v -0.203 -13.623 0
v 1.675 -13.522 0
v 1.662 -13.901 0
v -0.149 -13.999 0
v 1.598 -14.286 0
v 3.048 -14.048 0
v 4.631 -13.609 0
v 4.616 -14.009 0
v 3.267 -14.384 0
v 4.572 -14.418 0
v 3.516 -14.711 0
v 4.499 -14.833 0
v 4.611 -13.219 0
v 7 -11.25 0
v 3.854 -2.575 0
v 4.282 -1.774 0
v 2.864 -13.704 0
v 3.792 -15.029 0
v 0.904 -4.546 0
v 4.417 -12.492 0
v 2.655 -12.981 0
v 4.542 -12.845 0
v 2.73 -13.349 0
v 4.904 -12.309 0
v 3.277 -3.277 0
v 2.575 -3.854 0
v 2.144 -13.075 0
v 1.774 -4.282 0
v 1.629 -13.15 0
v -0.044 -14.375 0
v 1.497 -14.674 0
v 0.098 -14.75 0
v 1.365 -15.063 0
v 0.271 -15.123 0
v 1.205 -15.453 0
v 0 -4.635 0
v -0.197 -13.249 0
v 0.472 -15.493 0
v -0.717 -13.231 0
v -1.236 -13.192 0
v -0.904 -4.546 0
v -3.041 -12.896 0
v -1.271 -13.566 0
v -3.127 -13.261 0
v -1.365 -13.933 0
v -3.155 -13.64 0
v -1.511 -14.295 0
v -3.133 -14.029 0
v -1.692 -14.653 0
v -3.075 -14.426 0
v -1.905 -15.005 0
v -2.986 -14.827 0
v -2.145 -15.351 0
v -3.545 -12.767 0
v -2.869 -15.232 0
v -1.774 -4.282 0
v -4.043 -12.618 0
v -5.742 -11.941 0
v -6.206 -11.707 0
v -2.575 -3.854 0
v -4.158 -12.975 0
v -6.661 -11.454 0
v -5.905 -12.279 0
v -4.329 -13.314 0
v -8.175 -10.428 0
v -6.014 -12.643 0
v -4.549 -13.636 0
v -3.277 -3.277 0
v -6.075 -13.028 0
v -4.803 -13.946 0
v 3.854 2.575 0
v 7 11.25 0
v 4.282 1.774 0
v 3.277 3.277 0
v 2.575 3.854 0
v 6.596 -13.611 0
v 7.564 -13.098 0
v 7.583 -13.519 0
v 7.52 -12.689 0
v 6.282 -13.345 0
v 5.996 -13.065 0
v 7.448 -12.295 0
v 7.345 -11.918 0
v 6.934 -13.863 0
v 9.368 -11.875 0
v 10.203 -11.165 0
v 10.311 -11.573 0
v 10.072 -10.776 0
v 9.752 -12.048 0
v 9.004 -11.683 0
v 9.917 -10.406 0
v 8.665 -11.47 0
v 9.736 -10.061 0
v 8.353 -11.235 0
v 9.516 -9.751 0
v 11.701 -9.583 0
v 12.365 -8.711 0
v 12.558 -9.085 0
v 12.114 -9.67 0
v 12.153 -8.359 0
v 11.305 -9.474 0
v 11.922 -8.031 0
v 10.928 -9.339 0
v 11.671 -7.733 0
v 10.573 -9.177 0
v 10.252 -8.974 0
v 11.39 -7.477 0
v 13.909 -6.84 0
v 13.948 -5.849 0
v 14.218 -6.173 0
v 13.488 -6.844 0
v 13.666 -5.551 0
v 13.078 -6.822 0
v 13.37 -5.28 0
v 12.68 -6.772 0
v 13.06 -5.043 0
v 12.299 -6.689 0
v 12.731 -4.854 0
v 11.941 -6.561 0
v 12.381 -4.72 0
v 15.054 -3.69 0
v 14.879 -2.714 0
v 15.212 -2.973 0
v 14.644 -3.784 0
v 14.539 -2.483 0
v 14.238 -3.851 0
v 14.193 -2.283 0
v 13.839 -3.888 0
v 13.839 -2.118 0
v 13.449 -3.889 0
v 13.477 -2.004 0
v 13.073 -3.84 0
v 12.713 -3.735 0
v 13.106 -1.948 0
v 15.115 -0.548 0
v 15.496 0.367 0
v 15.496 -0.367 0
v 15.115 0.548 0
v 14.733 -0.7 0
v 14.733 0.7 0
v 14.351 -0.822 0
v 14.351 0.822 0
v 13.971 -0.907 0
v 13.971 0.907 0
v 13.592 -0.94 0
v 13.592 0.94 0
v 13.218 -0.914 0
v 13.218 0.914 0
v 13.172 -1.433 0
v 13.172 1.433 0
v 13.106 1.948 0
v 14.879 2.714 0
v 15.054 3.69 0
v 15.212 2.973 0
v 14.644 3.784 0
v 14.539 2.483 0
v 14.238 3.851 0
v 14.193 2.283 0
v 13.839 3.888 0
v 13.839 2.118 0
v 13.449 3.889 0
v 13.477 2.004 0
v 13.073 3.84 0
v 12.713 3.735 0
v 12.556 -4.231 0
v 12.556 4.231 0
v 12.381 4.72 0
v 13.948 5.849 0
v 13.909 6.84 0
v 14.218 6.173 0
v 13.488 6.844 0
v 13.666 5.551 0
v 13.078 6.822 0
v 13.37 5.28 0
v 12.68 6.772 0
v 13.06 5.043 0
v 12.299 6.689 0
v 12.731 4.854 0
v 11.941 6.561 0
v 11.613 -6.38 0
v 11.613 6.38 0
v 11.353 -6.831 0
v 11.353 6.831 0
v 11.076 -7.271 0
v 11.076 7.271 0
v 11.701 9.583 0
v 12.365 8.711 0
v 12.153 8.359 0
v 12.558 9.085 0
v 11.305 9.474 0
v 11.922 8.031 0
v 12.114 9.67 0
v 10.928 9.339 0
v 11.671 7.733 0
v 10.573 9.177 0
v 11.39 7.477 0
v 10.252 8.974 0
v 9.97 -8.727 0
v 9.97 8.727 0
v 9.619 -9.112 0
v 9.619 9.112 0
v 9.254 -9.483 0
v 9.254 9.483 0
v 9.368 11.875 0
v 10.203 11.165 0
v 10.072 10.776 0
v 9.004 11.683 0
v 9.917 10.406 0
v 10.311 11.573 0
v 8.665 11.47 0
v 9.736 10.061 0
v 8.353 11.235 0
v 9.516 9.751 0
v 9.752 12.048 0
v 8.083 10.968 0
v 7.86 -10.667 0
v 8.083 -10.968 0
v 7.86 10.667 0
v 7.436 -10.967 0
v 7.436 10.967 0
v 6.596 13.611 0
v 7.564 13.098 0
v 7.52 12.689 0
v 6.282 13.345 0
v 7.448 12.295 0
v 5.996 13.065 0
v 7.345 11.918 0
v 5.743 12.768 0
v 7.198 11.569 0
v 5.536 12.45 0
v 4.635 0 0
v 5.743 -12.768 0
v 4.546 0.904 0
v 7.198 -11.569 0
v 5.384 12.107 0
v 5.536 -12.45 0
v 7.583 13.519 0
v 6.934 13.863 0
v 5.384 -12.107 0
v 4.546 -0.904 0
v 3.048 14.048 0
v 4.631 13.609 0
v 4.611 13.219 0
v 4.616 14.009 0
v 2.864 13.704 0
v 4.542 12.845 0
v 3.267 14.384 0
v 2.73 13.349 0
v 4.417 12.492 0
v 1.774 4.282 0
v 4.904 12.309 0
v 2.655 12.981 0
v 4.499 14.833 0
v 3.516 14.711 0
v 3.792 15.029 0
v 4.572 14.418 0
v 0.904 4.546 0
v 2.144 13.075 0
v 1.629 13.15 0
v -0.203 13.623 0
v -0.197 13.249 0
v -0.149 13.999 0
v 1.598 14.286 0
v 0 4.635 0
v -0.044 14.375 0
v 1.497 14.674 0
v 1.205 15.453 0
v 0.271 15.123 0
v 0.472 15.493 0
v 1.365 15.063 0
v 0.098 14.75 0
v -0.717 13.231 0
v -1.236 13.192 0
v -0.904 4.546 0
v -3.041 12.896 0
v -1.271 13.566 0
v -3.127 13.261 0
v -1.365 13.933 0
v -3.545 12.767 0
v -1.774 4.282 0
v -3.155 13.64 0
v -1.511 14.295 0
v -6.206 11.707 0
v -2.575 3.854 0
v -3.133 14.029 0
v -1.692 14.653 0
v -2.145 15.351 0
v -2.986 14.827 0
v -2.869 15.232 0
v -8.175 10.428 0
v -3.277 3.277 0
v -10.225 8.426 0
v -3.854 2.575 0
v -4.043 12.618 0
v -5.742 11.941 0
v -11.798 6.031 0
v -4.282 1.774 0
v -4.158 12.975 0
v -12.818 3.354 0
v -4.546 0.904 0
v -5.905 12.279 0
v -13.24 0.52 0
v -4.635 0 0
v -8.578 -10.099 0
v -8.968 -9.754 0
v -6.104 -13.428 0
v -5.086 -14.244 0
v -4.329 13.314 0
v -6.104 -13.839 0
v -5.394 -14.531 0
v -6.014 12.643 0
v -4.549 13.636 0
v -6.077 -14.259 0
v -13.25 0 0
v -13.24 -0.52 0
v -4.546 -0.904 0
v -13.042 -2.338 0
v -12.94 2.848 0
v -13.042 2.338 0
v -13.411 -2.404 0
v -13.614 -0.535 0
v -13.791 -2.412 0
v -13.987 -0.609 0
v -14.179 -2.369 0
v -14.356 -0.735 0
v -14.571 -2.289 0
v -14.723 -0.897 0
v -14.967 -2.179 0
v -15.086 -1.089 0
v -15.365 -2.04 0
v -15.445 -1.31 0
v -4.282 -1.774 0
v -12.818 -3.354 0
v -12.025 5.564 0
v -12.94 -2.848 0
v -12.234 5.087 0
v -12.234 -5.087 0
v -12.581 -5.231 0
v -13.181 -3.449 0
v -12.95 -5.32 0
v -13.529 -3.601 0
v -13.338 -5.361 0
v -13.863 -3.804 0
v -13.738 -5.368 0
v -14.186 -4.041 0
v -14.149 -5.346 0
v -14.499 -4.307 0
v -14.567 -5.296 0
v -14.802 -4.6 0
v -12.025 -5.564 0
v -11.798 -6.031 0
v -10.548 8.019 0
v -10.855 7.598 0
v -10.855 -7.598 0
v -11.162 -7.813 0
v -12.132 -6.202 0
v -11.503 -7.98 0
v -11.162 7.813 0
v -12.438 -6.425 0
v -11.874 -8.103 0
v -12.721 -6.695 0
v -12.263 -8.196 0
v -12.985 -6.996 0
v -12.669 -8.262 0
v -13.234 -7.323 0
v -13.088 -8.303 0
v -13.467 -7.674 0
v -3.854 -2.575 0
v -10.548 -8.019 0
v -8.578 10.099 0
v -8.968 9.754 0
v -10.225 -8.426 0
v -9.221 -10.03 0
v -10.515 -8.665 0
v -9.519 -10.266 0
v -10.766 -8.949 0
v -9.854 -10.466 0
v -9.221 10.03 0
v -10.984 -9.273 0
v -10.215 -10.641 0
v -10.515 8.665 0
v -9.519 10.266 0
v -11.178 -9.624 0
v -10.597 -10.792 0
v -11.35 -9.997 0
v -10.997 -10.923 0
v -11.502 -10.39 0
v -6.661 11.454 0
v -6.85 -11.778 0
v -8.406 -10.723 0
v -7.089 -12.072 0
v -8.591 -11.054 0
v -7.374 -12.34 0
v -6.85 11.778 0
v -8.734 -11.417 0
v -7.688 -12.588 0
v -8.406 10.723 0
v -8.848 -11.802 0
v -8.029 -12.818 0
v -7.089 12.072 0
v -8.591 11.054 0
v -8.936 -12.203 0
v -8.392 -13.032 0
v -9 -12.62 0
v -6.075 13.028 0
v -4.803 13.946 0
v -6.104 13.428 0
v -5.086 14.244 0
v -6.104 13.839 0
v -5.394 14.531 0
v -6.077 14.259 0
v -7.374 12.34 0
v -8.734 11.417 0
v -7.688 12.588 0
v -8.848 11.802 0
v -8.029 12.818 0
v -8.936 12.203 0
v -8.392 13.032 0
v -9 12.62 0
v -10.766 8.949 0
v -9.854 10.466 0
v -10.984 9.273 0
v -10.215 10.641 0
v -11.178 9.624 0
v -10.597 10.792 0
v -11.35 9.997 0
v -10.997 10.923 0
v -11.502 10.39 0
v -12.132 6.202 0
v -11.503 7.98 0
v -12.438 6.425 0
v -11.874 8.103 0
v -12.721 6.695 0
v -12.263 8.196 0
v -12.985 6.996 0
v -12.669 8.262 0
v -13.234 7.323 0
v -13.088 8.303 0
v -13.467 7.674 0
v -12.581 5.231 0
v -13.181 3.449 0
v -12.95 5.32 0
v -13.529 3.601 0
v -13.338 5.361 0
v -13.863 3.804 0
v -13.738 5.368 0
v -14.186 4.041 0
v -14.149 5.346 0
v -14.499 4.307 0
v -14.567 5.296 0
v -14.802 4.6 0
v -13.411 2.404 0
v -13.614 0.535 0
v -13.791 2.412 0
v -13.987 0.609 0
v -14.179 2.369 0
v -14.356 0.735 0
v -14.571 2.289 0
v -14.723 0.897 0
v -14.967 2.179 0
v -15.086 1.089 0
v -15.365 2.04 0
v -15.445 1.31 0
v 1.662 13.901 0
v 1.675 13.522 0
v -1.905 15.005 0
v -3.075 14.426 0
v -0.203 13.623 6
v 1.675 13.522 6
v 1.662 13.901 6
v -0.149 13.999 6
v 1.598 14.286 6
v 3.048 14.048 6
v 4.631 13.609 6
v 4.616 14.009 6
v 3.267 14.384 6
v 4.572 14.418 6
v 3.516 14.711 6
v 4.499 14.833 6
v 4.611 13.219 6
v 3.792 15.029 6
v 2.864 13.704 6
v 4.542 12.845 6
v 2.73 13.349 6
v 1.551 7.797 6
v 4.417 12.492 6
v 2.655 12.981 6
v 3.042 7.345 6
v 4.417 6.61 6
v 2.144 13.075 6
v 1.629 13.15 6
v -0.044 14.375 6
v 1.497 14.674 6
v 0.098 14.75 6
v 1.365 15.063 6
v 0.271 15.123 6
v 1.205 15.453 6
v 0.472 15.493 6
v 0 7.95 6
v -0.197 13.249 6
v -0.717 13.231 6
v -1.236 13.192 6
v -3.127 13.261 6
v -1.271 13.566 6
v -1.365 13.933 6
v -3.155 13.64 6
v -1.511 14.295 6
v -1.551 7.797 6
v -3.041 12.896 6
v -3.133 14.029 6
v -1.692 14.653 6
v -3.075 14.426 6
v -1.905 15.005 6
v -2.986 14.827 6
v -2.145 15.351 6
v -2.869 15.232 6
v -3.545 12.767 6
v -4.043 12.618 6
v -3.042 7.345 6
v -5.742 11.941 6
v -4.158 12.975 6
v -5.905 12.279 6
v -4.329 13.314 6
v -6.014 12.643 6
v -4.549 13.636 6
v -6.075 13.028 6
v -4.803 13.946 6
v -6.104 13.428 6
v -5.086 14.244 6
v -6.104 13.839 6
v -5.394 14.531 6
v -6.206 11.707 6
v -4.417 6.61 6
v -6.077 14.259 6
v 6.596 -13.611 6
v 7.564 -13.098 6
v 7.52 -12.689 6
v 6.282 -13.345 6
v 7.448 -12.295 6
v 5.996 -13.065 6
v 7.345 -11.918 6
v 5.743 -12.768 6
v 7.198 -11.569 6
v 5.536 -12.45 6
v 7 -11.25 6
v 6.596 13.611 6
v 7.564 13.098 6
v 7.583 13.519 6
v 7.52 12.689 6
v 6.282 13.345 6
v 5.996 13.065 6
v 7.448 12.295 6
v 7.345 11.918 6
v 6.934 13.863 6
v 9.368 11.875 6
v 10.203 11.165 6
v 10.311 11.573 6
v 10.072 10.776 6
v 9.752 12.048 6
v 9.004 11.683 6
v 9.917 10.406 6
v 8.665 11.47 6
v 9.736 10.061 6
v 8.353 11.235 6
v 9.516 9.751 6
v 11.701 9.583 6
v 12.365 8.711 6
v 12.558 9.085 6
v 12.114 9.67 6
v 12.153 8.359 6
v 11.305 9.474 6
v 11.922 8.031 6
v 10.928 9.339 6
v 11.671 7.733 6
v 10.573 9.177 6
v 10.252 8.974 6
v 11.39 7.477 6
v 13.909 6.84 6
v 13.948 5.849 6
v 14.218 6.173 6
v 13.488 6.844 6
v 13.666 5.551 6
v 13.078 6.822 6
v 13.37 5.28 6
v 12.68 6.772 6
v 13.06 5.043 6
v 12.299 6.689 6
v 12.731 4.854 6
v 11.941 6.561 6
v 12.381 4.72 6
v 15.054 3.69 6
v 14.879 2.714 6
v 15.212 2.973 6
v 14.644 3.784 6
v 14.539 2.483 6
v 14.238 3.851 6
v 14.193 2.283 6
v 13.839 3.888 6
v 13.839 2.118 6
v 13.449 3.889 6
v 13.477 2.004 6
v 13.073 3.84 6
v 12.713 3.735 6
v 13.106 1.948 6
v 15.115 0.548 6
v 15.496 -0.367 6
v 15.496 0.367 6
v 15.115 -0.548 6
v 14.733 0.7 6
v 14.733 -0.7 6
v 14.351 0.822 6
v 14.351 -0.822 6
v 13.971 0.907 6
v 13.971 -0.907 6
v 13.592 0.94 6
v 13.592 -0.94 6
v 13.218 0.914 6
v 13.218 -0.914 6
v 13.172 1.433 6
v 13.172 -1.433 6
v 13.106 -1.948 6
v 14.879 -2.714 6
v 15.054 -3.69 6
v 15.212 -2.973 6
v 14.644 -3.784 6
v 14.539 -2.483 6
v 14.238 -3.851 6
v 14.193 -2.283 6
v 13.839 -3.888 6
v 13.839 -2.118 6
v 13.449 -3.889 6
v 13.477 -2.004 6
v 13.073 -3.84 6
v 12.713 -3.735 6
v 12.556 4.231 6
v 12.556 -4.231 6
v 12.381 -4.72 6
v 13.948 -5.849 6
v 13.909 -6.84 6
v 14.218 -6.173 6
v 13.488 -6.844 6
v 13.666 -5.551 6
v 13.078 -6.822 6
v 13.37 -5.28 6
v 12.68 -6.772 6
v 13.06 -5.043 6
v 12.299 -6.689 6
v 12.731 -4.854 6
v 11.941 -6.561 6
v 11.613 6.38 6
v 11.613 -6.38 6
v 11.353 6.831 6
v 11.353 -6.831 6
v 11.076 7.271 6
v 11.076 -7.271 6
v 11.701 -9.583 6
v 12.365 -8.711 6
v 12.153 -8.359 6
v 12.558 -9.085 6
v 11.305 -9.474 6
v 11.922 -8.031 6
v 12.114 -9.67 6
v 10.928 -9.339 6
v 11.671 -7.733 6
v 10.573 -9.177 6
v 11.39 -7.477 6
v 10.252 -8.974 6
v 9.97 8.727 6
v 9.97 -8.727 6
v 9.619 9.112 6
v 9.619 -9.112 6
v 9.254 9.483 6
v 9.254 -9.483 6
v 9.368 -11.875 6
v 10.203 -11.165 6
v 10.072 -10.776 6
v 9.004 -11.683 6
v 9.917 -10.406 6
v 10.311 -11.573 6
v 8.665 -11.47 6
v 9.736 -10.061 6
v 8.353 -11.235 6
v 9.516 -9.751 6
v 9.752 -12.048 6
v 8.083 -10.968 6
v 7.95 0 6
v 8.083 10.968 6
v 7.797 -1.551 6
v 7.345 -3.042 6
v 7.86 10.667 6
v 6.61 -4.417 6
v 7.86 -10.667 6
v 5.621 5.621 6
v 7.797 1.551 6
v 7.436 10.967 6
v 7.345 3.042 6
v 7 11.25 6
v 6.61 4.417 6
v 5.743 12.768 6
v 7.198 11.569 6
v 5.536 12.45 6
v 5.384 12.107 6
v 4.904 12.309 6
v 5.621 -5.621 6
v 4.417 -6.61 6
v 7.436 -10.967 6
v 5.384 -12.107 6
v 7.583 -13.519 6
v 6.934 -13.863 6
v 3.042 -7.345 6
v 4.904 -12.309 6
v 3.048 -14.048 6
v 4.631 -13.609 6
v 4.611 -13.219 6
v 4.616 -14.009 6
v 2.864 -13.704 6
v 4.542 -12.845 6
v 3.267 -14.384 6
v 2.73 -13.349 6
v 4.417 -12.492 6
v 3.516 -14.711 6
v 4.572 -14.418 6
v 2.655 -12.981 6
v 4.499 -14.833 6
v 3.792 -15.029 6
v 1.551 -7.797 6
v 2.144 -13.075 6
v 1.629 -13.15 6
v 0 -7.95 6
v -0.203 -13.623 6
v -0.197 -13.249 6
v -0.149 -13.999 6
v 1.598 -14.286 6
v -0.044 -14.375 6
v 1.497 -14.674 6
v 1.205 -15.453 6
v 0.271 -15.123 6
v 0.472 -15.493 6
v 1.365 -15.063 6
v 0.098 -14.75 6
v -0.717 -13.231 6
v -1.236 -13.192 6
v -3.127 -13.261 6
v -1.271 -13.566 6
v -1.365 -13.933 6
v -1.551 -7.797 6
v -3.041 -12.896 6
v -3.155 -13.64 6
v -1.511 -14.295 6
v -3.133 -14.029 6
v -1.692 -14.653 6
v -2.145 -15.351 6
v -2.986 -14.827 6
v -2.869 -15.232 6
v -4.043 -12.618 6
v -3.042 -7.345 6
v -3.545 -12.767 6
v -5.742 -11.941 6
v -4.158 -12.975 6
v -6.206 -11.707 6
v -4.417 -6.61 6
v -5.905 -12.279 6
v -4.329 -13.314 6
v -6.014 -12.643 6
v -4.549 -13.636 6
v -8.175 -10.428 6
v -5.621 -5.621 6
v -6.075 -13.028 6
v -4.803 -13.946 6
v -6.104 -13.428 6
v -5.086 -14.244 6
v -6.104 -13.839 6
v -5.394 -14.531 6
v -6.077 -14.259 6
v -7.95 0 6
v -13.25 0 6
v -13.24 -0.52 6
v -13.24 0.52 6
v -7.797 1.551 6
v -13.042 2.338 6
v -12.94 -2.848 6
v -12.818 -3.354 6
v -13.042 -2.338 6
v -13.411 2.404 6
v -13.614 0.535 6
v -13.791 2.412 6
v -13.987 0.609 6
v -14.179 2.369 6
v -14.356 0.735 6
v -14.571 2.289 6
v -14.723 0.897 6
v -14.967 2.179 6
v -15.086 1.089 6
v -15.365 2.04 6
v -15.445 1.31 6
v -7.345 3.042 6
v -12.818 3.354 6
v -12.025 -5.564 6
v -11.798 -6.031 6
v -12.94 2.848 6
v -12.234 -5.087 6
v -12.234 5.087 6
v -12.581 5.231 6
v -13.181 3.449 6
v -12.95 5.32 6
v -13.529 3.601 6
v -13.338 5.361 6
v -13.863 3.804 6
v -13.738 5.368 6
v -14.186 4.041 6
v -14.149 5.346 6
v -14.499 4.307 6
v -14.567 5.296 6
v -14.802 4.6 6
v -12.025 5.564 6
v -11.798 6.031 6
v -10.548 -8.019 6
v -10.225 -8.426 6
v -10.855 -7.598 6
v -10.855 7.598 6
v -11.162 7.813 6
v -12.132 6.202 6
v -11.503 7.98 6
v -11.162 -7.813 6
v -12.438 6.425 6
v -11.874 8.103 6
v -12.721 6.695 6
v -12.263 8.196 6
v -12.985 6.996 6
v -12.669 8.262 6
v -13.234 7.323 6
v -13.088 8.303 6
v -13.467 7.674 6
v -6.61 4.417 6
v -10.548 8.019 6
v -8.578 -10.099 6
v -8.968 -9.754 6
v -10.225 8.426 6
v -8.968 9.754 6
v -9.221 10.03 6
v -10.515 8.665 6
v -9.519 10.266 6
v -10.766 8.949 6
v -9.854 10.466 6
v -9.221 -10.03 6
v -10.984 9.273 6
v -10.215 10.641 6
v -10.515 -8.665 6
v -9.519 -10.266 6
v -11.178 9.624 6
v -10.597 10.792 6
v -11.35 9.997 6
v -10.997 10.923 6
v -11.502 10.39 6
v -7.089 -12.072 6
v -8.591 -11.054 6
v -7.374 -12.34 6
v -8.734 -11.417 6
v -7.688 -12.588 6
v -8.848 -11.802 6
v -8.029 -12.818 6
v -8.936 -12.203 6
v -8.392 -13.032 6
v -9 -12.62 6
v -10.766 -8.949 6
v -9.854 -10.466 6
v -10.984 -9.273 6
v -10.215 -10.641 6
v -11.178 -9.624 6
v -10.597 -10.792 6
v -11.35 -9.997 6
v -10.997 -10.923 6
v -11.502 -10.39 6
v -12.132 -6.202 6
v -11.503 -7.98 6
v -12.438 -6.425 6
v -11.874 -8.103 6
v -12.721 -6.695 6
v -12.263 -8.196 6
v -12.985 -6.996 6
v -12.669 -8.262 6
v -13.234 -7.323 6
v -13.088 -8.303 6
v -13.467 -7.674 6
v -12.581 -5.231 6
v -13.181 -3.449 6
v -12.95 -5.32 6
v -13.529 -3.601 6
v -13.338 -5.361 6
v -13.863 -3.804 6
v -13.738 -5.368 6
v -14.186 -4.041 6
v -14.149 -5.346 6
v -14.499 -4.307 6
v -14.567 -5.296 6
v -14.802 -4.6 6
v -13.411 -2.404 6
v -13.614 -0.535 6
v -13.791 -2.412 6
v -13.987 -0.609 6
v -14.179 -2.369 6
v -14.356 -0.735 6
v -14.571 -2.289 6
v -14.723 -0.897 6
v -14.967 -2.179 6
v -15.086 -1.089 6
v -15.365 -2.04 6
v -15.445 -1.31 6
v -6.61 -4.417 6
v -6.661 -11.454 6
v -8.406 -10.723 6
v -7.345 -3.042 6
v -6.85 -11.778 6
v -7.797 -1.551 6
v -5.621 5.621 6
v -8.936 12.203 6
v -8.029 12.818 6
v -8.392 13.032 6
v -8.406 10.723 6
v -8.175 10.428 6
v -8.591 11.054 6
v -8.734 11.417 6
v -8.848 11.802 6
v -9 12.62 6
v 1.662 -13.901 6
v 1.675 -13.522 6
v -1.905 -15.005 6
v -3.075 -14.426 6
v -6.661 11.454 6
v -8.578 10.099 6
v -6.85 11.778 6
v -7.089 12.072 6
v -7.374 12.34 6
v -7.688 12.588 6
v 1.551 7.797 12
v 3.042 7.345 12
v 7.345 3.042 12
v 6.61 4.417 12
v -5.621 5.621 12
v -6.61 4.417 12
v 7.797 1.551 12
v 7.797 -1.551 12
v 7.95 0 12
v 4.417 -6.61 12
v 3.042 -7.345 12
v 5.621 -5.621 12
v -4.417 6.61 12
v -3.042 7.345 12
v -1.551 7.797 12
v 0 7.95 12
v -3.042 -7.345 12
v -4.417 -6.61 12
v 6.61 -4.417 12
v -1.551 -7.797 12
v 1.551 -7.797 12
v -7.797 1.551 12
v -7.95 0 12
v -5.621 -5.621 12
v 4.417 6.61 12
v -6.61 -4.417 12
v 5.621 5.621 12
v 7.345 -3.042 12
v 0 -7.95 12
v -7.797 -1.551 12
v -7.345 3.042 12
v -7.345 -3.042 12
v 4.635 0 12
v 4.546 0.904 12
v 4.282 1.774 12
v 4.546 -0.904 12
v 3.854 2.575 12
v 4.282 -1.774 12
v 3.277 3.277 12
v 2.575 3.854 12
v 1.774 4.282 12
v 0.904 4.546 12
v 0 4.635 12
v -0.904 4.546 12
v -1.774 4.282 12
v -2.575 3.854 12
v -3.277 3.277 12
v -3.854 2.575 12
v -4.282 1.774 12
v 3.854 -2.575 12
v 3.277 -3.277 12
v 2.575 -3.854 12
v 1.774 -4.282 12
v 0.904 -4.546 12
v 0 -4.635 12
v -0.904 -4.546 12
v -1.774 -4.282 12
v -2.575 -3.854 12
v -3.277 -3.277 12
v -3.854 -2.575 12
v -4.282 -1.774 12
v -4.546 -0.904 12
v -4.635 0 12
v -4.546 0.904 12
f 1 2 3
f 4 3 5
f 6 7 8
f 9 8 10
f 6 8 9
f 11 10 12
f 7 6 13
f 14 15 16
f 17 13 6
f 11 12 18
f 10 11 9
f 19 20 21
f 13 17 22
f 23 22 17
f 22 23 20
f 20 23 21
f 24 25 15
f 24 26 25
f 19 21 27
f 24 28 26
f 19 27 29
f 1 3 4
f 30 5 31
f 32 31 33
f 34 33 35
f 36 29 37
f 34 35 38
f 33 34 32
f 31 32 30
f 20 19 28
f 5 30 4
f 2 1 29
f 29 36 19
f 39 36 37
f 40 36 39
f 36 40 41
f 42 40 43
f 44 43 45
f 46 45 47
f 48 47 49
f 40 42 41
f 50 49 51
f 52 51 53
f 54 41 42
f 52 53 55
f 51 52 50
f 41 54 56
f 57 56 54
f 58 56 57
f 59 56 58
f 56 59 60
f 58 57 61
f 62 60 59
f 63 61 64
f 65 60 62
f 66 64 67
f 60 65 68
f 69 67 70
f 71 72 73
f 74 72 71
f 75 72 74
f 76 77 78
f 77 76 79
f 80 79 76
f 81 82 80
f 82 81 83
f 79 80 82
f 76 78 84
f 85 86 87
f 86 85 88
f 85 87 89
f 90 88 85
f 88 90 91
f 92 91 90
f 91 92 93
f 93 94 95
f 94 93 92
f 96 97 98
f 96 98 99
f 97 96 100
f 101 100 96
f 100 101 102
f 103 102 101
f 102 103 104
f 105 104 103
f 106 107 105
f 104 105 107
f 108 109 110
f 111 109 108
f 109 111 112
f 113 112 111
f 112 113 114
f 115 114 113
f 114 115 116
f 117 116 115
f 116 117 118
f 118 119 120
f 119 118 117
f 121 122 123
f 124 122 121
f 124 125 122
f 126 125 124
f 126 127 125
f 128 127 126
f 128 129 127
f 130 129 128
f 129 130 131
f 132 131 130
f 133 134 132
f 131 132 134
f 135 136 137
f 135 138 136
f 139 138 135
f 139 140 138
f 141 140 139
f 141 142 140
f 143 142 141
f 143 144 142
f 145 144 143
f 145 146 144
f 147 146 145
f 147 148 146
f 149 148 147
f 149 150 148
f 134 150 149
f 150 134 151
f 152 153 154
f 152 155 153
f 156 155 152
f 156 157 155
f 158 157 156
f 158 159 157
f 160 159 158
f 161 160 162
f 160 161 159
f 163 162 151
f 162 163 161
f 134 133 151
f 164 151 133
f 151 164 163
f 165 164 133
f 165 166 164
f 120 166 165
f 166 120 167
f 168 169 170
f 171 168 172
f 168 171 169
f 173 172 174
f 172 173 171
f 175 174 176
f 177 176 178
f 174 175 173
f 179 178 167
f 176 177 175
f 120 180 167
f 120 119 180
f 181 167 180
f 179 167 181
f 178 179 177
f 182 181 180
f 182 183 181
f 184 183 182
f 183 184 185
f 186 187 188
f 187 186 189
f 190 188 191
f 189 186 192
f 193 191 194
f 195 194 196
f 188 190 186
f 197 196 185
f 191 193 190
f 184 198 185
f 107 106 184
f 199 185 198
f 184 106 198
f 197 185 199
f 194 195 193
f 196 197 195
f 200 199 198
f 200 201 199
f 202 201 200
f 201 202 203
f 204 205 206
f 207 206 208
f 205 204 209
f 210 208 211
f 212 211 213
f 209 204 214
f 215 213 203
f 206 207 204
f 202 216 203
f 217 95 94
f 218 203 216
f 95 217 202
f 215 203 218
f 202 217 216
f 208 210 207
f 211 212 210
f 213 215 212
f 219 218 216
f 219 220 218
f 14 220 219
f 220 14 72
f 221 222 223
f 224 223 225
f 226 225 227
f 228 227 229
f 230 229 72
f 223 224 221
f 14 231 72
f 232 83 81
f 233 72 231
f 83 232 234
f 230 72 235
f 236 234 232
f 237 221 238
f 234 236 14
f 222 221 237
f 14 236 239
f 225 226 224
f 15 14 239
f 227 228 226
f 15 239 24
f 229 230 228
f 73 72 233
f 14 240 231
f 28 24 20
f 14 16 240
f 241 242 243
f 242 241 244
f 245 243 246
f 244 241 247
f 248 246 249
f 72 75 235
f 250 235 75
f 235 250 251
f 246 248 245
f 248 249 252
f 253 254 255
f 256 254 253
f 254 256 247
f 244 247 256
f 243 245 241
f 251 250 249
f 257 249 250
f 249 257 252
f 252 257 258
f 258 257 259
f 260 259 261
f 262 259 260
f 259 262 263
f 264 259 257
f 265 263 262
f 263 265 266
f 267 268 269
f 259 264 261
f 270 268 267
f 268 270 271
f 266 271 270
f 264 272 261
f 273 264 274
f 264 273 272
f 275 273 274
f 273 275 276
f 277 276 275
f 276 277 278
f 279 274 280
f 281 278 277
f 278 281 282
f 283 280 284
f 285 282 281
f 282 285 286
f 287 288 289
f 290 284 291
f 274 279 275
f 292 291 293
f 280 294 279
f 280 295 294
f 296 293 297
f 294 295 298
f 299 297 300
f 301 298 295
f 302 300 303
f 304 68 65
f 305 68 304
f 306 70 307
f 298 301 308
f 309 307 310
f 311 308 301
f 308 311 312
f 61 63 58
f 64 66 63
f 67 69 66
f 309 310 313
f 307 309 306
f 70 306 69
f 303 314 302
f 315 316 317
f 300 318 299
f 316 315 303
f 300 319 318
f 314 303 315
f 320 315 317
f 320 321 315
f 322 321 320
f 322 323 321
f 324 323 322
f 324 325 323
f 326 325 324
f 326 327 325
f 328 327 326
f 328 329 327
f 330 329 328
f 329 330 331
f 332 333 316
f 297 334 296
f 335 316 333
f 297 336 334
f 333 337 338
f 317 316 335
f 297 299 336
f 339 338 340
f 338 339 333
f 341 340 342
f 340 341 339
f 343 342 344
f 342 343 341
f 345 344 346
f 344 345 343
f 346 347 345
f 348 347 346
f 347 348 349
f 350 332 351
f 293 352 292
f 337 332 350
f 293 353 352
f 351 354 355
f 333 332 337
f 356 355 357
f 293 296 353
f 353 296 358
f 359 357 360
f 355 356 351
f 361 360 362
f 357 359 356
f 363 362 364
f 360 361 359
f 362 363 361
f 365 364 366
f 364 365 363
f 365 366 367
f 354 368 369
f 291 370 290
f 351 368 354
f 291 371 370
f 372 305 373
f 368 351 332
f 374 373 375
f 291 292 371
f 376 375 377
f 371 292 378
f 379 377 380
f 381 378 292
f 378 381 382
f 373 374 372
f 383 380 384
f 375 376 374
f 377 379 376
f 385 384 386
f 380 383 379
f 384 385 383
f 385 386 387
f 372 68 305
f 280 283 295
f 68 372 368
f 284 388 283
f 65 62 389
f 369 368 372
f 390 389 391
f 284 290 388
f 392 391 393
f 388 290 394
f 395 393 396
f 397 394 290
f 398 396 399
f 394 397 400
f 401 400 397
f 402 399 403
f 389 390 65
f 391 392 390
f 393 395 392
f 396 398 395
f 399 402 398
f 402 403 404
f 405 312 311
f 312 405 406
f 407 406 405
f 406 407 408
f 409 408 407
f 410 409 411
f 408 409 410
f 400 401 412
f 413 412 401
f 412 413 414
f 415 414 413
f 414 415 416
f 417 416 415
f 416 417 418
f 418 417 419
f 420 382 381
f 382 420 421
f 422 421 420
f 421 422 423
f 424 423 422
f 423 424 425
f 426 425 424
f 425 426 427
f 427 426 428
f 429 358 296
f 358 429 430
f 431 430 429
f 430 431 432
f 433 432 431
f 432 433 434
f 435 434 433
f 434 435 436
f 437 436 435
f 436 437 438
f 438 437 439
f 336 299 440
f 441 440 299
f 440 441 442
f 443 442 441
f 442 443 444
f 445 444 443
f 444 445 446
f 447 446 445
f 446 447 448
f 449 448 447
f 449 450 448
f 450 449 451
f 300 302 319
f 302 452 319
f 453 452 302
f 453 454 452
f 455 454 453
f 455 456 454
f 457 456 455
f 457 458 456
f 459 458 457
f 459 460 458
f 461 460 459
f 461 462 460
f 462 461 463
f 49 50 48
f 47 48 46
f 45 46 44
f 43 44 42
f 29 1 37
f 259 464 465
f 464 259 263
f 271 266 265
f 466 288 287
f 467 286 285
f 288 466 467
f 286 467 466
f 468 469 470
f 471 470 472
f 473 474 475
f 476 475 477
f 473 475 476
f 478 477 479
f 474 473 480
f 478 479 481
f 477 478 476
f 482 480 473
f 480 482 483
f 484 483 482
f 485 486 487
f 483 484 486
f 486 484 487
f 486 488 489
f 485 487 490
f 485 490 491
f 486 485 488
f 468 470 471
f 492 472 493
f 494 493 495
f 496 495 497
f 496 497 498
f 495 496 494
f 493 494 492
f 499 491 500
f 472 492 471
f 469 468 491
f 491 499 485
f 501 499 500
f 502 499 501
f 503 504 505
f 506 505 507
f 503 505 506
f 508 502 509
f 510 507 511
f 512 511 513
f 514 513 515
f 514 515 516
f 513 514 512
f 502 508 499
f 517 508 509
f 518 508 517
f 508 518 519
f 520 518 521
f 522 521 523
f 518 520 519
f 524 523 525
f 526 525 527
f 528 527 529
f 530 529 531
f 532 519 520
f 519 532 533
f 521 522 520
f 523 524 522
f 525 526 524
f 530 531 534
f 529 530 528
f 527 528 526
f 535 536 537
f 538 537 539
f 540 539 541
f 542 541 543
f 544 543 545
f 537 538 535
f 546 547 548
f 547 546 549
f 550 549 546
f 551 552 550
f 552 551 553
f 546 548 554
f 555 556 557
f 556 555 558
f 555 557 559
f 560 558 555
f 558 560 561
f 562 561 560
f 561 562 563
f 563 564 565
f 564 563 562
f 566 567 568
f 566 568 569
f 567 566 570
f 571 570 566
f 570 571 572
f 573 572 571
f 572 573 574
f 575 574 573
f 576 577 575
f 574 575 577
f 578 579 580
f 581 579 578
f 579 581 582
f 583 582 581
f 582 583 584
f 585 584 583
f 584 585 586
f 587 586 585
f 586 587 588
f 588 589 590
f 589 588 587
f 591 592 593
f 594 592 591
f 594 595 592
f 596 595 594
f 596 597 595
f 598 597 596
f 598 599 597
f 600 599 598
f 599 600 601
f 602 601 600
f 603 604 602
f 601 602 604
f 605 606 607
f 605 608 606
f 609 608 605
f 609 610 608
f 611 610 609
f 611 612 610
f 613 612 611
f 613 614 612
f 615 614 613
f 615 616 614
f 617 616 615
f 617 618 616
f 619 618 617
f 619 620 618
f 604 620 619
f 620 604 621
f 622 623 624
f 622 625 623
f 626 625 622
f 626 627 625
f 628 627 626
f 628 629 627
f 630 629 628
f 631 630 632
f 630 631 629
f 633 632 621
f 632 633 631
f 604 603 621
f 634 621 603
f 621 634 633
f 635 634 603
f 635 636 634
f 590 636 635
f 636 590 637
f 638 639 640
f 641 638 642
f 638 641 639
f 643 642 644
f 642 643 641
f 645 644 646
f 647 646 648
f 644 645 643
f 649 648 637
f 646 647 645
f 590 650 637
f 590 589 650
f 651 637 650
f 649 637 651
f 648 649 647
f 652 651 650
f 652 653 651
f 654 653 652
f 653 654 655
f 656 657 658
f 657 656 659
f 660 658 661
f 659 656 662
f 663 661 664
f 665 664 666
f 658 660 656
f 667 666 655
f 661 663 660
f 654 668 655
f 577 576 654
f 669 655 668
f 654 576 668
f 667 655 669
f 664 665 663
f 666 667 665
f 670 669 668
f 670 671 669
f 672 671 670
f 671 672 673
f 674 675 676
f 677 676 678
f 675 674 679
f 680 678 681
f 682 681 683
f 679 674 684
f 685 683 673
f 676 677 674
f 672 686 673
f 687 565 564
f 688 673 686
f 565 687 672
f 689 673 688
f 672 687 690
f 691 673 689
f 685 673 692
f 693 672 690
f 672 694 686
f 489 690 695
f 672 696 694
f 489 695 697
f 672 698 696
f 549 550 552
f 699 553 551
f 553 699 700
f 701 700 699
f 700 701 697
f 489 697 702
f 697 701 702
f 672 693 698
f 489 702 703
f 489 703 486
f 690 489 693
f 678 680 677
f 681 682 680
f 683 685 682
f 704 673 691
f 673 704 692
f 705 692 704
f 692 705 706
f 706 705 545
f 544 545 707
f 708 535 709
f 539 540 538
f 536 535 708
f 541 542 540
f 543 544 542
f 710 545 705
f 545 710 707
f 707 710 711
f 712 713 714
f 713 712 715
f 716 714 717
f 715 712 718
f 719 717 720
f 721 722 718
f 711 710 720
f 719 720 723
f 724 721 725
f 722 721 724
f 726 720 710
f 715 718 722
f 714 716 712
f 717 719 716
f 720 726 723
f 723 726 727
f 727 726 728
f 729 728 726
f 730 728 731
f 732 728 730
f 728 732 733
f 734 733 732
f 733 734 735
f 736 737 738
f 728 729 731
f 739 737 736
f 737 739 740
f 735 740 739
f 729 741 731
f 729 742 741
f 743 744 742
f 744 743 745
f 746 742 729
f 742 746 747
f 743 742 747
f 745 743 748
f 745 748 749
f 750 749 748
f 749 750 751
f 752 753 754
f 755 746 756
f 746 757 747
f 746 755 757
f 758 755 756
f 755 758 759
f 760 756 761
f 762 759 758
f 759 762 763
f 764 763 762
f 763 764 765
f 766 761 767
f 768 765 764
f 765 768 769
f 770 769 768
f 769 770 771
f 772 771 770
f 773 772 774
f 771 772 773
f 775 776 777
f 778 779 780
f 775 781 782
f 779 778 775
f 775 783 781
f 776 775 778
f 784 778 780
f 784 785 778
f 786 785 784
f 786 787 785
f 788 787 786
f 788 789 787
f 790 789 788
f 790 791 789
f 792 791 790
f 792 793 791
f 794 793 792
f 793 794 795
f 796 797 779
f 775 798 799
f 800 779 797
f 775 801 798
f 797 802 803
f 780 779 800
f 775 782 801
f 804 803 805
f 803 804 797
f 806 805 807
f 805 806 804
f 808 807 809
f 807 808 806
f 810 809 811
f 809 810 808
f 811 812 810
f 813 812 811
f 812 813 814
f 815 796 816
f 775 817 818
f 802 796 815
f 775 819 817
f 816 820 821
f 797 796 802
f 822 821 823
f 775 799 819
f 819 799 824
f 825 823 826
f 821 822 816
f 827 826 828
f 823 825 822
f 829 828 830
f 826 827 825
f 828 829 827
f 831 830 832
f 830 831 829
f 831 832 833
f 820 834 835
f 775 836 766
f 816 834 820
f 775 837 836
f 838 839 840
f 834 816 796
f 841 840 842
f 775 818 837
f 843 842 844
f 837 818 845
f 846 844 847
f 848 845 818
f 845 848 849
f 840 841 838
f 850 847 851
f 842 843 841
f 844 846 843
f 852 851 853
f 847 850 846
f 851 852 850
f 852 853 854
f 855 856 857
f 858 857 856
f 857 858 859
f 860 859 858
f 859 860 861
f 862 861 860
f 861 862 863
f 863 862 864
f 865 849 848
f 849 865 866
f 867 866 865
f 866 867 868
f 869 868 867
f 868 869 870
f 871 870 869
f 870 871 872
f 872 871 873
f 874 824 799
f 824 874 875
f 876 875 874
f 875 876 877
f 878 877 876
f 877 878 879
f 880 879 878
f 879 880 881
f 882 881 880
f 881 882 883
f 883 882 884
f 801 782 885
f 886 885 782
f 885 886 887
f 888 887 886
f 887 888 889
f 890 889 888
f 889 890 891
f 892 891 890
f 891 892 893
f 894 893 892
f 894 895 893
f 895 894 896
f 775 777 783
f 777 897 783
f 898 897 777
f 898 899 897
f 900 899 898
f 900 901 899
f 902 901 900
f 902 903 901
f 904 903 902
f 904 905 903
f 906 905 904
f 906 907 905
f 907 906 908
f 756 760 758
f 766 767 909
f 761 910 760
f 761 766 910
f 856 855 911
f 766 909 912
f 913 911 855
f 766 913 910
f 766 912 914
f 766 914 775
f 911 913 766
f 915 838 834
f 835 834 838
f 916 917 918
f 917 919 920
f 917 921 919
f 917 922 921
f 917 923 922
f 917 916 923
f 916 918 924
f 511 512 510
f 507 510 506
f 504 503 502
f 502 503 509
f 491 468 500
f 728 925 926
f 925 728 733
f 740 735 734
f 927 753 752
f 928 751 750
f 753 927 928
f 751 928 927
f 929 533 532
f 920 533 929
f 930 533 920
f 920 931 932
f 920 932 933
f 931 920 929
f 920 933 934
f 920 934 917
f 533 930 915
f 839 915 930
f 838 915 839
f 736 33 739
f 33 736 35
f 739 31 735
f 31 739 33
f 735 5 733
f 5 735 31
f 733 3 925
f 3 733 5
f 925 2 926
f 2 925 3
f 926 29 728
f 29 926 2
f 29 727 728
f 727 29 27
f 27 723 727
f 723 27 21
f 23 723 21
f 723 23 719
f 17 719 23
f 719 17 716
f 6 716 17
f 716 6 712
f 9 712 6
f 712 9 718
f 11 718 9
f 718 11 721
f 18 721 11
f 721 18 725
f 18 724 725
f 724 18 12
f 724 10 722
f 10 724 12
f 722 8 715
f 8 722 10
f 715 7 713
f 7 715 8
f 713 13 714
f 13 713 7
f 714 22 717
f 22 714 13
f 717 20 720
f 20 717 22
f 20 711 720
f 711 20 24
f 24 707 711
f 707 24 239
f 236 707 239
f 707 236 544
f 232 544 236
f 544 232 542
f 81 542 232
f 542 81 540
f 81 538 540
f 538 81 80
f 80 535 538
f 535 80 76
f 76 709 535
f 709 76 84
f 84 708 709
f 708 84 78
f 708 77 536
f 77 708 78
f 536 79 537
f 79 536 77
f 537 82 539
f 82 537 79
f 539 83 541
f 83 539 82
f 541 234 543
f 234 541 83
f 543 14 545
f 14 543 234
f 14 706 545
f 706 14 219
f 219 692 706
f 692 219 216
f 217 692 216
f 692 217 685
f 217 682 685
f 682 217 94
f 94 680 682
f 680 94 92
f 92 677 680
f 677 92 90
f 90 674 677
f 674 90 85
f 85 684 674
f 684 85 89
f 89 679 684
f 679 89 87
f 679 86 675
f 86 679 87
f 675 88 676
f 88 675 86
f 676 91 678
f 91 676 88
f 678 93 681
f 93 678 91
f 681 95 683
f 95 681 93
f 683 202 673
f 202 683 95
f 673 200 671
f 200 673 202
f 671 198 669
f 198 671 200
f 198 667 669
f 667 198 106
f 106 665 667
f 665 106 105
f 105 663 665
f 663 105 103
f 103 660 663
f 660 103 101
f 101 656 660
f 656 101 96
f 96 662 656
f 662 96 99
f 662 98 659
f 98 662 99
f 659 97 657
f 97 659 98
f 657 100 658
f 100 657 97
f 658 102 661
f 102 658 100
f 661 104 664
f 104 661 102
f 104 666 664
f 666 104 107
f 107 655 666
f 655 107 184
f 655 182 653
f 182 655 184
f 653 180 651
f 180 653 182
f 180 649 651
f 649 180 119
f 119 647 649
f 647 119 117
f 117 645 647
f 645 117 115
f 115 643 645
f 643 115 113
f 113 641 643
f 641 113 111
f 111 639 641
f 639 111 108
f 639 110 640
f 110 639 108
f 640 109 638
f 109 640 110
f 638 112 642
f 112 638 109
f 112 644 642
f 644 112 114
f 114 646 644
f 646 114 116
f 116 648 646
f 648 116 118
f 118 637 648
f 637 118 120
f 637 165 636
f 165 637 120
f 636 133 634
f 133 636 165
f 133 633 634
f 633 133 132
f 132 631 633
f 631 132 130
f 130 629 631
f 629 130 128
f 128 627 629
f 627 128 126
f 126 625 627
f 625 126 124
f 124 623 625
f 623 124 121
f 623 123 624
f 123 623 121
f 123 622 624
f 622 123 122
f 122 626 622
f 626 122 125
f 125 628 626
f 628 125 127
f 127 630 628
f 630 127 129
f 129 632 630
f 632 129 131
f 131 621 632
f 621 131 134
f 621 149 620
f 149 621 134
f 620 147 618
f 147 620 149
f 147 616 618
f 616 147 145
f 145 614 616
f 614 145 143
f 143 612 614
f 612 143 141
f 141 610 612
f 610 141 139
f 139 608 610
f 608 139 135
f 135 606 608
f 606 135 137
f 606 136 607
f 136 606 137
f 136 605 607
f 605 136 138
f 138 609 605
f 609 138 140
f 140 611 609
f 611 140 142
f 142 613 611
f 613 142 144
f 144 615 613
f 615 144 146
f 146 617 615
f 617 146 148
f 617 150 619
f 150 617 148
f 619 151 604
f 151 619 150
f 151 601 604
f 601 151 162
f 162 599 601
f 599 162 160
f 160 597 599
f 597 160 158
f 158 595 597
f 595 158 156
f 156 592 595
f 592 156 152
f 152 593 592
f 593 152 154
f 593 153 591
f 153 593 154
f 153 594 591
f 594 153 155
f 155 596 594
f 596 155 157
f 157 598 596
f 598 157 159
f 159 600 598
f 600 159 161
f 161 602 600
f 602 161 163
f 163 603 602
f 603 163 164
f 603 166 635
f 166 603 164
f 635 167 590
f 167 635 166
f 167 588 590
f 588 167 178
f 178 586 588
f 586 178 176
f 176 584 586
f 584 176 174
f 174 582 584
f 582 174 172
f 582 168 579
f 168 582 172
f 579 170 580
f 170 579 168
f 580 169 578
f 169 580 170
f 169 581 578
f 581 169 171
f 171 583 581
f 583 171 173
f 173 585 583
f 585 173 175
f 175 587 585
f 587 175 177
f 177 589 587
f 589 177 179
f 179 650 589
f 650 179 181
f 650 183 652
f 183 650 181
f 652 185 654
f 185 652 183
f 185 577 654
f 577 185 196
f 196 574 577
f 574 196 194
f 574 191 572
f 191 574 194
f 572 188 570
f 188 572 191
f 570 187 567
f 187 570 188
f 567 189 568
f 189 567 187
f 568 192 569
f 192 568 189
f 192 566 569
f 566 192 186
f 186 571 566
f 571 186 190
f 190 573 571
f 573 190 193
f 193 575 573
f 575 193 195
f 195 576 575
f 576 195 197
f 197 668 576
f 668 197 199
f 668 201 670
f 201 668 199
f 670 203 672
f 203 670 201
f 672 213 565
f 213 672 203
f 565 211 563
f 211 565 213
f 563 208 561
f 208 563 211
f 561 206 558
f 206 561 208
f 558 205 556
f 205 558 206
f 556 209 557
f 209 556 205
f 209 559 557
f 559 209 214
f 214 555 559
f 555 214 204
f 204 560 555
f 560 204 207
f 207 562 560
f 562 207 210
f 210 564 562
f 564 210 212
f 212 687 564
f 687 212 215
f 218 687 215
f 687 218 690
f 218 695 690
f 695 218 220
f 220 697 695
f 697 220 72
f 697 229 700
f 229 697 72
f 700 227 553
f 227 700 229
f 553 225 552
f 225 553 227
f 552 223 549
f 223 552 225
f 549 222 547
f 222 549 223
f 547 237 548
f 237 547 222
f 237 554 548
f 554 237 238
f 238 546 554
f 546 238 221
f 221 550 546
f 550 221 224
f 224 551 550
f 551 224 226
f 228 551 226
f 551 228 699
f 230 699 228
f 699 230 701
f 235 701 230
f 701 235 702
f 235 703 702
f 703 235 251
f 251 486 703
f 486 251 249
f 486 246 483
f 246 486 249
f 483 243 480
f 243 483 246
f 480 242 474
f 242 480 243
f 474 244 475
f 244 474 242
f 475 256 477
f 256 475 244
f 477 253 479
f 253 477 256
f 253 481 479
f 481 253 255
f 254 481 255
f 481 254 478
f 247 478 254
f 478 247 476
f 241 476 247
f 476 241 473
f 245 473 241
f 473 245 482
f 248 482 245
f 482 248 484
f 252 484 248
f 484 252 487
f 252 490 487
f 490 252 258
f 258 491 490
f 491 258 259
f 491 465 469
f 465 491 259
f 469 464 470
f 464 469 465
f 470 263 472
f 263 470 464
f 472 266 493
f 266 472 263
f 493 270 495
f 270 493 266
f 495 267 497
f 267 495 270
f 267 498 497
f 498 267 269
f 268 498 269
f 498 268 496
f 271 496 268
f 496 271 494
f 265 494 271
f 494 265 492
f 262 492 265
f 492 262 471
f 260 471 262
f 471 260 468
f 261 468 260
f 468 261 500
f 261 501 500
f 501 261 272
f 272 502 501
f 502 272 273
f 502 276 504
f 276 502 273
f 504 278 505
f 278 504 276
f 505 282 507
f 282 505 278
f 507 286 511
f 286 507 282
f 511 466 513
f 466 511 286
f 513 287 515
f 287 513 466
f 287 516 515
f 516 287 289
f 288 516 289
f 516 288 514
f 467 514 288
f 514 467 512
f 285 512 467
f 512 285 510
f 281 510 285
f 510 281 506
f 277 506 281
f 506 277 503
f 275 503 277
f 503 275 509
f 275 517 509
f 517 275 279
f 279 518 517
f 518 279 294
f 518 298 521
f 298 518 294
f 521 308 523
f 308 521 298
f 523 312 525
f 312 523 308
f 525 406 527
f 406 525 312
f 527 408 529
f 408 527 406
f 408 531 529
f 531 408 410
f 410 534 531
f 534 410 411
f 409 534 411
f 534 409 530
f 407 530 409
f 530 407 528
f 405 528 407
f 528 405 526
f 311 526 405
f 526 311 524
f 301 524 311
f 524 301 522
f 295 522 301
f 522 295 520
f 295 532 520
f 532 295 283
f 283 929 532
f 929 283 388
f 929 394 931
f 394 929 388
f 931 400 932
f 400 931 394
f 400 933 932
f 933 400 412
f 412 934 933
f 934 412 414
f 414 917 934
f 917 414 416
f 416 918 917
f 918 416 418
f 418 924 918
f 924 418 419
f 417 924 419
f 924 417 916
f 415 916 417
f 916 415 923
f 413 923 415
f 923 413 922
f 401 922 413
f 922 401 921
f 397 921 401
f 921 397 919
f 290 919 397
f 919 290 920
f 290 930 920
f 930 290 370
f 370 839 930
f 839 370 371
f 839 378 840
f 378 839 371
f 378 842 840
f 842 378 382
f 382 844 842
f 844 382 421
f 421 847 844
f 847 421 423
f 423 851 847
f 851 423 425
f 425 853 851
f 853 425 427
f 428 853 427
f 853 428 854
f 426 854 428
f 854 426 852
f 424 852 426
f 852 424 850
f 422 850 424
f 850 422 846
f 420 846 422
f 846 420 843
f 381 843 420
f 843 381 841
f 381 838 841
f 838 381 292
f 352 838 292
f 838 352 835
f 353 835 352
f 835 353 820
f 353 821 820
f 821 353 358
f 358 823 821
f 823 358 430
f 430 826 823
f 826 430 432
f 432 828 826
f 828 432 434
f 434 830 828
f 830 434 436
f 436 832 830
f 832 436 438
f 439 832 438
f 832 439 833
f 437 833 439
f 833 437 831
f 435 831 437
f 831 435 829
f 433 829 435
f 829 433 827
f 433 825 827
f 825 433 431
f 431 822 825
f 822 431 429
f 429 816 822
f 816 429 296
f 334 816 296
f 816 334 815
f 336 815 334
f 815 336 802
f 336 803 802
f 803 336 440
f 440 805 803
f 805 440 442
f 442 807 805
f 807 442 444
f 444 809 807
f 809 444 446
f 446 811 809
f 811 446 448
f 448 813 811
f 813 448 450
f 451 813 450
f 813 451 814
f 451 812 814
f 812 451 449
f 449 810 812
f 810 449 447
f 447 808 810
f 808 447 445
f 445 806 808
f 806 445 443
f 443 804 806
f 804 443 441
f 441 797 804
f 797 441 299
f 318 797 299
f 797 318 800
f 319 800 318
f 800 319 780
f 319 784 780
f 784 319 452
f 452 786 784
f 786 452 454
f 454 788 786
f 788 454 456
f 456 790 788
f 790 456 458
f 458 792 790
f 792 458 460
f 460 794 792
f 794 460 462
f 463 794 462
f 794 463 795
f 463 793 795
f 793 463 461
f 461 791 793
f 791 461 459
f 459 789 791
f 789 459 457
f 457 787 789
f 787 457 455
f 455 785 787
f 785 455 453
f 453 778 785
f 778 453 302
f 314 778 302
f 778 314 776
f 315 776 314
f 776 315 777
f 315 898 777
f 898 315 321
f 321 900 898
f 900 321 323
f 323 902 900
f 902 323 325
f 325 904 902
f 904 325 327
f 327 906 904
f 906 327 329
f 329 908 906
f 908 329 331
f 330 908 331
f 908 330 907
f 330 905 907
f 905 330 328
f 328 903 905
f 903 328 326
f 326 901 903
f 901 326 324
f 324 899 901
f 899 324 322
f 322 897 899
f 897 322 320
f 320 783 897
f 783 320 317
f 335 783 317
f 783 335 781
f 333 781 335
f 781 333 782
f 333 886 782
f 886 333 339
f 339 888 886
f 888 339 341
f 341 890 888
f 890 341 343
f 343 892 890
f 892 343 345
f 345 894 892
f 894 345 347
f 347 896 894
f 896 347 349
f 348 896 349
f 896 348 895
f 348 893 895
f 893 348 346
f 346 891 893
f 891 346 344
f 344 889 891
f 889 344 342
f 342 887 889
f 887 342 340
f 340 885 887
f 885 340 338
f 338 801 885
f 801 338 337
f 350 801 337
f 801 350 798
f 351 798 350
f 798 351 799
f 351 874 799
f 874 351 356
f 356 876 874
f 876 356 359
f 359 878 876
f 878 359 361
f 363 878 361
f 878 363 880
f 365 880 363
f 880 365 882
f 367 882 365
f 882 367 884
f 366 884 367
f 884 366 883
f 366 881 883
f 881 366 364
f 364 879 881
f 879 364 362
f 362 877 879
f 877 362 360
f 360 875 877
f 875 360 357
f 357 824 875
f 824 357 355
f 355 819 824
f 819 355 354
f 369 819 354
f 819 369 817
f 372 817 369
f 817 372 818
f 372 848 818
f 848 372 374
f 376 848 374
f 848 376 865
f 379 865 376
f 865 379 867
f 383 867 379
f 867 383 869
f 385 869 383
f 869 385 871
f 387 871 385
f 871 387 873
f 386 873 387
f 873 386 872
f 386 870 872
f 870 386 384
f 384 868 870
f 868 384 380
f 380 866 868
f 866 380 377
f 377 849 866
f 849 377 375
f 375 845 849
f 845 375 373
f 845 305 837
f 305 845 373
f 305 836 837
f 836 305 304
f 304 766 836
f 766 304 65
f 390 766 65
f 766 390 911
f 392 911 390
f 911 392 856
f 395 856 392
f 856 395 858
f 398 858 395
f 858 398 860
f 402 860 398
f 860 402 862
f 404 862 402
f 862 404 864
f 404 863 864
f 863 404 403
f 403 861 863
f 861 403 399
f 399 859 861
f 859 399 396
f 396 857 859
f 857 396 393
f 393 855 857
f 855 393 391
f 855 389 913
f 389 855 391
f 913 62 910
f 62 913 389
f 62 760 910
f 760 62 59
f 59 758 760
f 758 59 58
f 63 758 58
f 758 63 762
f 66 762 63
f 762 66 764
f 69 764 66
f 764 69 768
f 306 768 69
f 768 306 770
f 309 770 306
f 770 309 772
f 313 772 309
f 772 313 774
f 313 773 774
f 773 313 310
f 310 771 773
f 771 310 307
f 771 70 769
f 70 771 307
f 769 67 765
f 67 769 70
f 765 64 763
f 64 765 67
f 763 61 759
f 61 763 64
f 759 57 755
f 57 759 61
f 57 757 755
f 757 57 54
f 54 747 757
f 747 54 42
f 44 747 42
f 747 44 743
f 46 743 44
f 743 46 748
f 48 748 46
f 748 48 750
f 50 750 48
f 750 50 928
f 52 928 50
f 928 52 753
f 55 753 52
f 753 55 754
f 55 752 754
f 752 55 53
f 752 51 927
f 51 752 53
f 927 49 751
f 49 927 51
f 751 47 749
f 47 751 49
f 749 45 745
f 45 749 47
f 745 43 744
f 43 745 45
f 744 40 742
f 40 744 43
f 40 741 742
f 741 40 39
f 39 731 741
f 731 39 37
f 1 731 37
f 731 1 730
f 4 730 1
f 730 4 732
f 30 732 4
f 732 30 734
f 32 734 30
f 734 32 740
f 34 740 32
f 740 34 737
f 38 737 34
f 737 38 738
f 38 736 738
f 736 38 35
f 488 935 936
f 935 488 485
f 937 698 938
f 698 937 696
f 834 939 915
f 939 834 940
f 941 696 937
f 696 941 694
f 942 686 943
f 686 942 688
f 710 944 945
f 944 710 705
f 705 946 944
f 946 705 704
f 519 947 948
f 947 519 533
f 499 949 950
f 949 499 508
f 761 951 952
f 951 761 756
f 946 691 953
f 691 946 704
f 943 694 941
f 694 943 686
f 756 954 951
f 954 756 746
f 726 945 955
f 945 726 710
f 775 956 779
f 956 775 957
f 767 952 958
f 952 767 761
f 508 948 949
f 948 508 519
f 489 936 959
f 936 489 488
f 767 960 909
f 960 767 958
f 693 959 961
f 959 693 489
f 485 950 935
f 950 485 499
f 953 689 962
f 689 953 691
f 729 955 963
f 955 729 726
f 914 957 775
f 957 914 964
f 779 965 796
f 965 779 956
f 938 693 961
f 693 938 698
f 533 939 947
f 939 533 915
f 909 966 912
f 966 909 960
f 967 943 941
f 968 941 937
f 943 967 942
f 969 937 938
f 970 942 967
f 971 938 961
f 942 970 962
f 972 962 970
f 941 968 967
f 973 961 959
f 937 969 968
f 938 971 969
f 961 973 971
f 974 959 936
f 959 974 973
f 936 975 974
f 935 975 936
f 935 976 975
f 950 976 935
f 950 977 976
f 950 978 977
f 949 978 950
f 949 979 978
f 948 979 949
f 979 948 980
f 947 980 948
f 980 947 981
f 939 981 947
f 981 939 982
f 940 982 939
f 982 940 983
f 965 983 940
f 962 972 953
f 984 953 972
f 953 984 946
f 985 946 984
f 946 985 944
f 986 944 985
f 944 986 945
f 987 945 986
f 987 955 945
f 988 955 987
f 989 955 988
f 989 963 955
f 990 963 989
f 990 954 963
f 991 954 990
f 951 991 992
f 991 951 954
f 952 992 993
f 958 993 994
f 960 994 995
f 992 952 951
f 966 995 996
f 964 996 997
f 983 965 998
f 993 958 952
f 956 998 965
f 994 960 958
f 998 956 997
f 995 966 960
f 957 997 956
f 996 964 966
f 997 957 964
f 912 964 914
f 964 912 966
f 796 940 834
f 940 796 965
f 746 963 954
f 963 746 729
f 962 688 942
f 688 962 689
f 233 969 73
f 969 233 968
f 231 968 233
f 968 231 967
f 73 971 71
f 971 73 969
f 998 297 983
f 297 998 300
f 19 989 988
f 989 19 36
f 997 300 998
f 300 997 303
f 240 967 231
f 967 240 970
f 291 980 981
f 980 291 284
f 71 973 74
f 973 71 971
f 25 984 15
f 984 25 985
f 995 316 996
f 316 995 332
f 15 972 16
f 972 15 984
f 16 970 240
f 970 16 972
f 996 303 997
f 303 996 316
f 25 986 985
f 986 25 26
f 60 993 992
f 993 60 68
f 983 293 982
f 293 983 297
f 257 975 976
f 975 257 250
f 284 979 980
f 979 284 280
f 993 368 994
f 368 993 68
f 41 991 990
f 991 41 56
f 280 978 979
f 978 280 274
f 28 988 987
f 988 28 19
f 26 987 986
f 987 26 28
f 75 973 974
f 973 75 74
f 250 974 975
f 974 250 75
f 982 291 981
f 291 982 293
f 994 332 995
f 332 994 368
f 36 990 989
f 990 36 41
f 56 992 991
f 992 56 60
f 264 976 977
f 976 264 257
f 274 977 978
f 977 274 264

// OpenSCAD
$fn = 32;

// ----------------------------------------------------------------------
// Spur gear: m=1 z=29, 31 mm tip diameter x 12 mm
// ----------------------------------------------------------------------

// --- parameters (mm) ---
modul = 1;                // module
n_teeth = 29;             // number of teeth
width = 6;                // face width
pa = 20;                  // pressure angle, deg
shaft_d = 9.27;           // shaft bore
boss_d = 15.9;            // hub diameter
boss_h = 6;               // hub above the face

/* --- involute profile --- */
pitch_r = modul * n_teeth / 2;
base_r = pitch_r * cos(pa);
tip_r = pitch_r + modul;
root_r = pitch_r - 1.25 * modul;
flank_steps = 6;

function inv_deg(a) = (tan(a) - a * PI / 180) * 180 / PI;
function flank_r(i) = root_r + (tip_r - root_r) * i / flank_steps;
function half_angle(r) = 90 / n_teeth + inv_deg(pa) - inv_deg(acos(min(1, base_r / r)));
function tooth_pt(k, i, side) =
    let (r = flank_r(i), a = k * 360 / n_teeth + side * half_angle(r))
    [r * cos(a), r * sin(a)];

module tooth_profile() {
  polygon(points = [
    for (k = [0 : n_teeth - 1])
      each [
        for (i = [0 : flank_steps]) tooth_pt(k, i, -1),
        for (i = [flank_steps : -1 : 0]) tooth_pt(k, i, 1),
        let (ta = (k + 0.5) * 360 / n_teeth)
          [root_r * cos(ta), root_r * sin(ta)]
      ]
  ]);
}

module gear_disc() {
  linear_extrude(height = width) tooth_profile();
}

module hub_boss() {
  translate([0, 0, width - 1]) cylinder(h = boss_h + 1, d = boss_d);
}

difference() {
  union() {
    gear_disc();
    hub_boss();
  }
  translate([0, 0, -1]) cylinder(h = width + boss_h + 3, d = shaft_d);
}
